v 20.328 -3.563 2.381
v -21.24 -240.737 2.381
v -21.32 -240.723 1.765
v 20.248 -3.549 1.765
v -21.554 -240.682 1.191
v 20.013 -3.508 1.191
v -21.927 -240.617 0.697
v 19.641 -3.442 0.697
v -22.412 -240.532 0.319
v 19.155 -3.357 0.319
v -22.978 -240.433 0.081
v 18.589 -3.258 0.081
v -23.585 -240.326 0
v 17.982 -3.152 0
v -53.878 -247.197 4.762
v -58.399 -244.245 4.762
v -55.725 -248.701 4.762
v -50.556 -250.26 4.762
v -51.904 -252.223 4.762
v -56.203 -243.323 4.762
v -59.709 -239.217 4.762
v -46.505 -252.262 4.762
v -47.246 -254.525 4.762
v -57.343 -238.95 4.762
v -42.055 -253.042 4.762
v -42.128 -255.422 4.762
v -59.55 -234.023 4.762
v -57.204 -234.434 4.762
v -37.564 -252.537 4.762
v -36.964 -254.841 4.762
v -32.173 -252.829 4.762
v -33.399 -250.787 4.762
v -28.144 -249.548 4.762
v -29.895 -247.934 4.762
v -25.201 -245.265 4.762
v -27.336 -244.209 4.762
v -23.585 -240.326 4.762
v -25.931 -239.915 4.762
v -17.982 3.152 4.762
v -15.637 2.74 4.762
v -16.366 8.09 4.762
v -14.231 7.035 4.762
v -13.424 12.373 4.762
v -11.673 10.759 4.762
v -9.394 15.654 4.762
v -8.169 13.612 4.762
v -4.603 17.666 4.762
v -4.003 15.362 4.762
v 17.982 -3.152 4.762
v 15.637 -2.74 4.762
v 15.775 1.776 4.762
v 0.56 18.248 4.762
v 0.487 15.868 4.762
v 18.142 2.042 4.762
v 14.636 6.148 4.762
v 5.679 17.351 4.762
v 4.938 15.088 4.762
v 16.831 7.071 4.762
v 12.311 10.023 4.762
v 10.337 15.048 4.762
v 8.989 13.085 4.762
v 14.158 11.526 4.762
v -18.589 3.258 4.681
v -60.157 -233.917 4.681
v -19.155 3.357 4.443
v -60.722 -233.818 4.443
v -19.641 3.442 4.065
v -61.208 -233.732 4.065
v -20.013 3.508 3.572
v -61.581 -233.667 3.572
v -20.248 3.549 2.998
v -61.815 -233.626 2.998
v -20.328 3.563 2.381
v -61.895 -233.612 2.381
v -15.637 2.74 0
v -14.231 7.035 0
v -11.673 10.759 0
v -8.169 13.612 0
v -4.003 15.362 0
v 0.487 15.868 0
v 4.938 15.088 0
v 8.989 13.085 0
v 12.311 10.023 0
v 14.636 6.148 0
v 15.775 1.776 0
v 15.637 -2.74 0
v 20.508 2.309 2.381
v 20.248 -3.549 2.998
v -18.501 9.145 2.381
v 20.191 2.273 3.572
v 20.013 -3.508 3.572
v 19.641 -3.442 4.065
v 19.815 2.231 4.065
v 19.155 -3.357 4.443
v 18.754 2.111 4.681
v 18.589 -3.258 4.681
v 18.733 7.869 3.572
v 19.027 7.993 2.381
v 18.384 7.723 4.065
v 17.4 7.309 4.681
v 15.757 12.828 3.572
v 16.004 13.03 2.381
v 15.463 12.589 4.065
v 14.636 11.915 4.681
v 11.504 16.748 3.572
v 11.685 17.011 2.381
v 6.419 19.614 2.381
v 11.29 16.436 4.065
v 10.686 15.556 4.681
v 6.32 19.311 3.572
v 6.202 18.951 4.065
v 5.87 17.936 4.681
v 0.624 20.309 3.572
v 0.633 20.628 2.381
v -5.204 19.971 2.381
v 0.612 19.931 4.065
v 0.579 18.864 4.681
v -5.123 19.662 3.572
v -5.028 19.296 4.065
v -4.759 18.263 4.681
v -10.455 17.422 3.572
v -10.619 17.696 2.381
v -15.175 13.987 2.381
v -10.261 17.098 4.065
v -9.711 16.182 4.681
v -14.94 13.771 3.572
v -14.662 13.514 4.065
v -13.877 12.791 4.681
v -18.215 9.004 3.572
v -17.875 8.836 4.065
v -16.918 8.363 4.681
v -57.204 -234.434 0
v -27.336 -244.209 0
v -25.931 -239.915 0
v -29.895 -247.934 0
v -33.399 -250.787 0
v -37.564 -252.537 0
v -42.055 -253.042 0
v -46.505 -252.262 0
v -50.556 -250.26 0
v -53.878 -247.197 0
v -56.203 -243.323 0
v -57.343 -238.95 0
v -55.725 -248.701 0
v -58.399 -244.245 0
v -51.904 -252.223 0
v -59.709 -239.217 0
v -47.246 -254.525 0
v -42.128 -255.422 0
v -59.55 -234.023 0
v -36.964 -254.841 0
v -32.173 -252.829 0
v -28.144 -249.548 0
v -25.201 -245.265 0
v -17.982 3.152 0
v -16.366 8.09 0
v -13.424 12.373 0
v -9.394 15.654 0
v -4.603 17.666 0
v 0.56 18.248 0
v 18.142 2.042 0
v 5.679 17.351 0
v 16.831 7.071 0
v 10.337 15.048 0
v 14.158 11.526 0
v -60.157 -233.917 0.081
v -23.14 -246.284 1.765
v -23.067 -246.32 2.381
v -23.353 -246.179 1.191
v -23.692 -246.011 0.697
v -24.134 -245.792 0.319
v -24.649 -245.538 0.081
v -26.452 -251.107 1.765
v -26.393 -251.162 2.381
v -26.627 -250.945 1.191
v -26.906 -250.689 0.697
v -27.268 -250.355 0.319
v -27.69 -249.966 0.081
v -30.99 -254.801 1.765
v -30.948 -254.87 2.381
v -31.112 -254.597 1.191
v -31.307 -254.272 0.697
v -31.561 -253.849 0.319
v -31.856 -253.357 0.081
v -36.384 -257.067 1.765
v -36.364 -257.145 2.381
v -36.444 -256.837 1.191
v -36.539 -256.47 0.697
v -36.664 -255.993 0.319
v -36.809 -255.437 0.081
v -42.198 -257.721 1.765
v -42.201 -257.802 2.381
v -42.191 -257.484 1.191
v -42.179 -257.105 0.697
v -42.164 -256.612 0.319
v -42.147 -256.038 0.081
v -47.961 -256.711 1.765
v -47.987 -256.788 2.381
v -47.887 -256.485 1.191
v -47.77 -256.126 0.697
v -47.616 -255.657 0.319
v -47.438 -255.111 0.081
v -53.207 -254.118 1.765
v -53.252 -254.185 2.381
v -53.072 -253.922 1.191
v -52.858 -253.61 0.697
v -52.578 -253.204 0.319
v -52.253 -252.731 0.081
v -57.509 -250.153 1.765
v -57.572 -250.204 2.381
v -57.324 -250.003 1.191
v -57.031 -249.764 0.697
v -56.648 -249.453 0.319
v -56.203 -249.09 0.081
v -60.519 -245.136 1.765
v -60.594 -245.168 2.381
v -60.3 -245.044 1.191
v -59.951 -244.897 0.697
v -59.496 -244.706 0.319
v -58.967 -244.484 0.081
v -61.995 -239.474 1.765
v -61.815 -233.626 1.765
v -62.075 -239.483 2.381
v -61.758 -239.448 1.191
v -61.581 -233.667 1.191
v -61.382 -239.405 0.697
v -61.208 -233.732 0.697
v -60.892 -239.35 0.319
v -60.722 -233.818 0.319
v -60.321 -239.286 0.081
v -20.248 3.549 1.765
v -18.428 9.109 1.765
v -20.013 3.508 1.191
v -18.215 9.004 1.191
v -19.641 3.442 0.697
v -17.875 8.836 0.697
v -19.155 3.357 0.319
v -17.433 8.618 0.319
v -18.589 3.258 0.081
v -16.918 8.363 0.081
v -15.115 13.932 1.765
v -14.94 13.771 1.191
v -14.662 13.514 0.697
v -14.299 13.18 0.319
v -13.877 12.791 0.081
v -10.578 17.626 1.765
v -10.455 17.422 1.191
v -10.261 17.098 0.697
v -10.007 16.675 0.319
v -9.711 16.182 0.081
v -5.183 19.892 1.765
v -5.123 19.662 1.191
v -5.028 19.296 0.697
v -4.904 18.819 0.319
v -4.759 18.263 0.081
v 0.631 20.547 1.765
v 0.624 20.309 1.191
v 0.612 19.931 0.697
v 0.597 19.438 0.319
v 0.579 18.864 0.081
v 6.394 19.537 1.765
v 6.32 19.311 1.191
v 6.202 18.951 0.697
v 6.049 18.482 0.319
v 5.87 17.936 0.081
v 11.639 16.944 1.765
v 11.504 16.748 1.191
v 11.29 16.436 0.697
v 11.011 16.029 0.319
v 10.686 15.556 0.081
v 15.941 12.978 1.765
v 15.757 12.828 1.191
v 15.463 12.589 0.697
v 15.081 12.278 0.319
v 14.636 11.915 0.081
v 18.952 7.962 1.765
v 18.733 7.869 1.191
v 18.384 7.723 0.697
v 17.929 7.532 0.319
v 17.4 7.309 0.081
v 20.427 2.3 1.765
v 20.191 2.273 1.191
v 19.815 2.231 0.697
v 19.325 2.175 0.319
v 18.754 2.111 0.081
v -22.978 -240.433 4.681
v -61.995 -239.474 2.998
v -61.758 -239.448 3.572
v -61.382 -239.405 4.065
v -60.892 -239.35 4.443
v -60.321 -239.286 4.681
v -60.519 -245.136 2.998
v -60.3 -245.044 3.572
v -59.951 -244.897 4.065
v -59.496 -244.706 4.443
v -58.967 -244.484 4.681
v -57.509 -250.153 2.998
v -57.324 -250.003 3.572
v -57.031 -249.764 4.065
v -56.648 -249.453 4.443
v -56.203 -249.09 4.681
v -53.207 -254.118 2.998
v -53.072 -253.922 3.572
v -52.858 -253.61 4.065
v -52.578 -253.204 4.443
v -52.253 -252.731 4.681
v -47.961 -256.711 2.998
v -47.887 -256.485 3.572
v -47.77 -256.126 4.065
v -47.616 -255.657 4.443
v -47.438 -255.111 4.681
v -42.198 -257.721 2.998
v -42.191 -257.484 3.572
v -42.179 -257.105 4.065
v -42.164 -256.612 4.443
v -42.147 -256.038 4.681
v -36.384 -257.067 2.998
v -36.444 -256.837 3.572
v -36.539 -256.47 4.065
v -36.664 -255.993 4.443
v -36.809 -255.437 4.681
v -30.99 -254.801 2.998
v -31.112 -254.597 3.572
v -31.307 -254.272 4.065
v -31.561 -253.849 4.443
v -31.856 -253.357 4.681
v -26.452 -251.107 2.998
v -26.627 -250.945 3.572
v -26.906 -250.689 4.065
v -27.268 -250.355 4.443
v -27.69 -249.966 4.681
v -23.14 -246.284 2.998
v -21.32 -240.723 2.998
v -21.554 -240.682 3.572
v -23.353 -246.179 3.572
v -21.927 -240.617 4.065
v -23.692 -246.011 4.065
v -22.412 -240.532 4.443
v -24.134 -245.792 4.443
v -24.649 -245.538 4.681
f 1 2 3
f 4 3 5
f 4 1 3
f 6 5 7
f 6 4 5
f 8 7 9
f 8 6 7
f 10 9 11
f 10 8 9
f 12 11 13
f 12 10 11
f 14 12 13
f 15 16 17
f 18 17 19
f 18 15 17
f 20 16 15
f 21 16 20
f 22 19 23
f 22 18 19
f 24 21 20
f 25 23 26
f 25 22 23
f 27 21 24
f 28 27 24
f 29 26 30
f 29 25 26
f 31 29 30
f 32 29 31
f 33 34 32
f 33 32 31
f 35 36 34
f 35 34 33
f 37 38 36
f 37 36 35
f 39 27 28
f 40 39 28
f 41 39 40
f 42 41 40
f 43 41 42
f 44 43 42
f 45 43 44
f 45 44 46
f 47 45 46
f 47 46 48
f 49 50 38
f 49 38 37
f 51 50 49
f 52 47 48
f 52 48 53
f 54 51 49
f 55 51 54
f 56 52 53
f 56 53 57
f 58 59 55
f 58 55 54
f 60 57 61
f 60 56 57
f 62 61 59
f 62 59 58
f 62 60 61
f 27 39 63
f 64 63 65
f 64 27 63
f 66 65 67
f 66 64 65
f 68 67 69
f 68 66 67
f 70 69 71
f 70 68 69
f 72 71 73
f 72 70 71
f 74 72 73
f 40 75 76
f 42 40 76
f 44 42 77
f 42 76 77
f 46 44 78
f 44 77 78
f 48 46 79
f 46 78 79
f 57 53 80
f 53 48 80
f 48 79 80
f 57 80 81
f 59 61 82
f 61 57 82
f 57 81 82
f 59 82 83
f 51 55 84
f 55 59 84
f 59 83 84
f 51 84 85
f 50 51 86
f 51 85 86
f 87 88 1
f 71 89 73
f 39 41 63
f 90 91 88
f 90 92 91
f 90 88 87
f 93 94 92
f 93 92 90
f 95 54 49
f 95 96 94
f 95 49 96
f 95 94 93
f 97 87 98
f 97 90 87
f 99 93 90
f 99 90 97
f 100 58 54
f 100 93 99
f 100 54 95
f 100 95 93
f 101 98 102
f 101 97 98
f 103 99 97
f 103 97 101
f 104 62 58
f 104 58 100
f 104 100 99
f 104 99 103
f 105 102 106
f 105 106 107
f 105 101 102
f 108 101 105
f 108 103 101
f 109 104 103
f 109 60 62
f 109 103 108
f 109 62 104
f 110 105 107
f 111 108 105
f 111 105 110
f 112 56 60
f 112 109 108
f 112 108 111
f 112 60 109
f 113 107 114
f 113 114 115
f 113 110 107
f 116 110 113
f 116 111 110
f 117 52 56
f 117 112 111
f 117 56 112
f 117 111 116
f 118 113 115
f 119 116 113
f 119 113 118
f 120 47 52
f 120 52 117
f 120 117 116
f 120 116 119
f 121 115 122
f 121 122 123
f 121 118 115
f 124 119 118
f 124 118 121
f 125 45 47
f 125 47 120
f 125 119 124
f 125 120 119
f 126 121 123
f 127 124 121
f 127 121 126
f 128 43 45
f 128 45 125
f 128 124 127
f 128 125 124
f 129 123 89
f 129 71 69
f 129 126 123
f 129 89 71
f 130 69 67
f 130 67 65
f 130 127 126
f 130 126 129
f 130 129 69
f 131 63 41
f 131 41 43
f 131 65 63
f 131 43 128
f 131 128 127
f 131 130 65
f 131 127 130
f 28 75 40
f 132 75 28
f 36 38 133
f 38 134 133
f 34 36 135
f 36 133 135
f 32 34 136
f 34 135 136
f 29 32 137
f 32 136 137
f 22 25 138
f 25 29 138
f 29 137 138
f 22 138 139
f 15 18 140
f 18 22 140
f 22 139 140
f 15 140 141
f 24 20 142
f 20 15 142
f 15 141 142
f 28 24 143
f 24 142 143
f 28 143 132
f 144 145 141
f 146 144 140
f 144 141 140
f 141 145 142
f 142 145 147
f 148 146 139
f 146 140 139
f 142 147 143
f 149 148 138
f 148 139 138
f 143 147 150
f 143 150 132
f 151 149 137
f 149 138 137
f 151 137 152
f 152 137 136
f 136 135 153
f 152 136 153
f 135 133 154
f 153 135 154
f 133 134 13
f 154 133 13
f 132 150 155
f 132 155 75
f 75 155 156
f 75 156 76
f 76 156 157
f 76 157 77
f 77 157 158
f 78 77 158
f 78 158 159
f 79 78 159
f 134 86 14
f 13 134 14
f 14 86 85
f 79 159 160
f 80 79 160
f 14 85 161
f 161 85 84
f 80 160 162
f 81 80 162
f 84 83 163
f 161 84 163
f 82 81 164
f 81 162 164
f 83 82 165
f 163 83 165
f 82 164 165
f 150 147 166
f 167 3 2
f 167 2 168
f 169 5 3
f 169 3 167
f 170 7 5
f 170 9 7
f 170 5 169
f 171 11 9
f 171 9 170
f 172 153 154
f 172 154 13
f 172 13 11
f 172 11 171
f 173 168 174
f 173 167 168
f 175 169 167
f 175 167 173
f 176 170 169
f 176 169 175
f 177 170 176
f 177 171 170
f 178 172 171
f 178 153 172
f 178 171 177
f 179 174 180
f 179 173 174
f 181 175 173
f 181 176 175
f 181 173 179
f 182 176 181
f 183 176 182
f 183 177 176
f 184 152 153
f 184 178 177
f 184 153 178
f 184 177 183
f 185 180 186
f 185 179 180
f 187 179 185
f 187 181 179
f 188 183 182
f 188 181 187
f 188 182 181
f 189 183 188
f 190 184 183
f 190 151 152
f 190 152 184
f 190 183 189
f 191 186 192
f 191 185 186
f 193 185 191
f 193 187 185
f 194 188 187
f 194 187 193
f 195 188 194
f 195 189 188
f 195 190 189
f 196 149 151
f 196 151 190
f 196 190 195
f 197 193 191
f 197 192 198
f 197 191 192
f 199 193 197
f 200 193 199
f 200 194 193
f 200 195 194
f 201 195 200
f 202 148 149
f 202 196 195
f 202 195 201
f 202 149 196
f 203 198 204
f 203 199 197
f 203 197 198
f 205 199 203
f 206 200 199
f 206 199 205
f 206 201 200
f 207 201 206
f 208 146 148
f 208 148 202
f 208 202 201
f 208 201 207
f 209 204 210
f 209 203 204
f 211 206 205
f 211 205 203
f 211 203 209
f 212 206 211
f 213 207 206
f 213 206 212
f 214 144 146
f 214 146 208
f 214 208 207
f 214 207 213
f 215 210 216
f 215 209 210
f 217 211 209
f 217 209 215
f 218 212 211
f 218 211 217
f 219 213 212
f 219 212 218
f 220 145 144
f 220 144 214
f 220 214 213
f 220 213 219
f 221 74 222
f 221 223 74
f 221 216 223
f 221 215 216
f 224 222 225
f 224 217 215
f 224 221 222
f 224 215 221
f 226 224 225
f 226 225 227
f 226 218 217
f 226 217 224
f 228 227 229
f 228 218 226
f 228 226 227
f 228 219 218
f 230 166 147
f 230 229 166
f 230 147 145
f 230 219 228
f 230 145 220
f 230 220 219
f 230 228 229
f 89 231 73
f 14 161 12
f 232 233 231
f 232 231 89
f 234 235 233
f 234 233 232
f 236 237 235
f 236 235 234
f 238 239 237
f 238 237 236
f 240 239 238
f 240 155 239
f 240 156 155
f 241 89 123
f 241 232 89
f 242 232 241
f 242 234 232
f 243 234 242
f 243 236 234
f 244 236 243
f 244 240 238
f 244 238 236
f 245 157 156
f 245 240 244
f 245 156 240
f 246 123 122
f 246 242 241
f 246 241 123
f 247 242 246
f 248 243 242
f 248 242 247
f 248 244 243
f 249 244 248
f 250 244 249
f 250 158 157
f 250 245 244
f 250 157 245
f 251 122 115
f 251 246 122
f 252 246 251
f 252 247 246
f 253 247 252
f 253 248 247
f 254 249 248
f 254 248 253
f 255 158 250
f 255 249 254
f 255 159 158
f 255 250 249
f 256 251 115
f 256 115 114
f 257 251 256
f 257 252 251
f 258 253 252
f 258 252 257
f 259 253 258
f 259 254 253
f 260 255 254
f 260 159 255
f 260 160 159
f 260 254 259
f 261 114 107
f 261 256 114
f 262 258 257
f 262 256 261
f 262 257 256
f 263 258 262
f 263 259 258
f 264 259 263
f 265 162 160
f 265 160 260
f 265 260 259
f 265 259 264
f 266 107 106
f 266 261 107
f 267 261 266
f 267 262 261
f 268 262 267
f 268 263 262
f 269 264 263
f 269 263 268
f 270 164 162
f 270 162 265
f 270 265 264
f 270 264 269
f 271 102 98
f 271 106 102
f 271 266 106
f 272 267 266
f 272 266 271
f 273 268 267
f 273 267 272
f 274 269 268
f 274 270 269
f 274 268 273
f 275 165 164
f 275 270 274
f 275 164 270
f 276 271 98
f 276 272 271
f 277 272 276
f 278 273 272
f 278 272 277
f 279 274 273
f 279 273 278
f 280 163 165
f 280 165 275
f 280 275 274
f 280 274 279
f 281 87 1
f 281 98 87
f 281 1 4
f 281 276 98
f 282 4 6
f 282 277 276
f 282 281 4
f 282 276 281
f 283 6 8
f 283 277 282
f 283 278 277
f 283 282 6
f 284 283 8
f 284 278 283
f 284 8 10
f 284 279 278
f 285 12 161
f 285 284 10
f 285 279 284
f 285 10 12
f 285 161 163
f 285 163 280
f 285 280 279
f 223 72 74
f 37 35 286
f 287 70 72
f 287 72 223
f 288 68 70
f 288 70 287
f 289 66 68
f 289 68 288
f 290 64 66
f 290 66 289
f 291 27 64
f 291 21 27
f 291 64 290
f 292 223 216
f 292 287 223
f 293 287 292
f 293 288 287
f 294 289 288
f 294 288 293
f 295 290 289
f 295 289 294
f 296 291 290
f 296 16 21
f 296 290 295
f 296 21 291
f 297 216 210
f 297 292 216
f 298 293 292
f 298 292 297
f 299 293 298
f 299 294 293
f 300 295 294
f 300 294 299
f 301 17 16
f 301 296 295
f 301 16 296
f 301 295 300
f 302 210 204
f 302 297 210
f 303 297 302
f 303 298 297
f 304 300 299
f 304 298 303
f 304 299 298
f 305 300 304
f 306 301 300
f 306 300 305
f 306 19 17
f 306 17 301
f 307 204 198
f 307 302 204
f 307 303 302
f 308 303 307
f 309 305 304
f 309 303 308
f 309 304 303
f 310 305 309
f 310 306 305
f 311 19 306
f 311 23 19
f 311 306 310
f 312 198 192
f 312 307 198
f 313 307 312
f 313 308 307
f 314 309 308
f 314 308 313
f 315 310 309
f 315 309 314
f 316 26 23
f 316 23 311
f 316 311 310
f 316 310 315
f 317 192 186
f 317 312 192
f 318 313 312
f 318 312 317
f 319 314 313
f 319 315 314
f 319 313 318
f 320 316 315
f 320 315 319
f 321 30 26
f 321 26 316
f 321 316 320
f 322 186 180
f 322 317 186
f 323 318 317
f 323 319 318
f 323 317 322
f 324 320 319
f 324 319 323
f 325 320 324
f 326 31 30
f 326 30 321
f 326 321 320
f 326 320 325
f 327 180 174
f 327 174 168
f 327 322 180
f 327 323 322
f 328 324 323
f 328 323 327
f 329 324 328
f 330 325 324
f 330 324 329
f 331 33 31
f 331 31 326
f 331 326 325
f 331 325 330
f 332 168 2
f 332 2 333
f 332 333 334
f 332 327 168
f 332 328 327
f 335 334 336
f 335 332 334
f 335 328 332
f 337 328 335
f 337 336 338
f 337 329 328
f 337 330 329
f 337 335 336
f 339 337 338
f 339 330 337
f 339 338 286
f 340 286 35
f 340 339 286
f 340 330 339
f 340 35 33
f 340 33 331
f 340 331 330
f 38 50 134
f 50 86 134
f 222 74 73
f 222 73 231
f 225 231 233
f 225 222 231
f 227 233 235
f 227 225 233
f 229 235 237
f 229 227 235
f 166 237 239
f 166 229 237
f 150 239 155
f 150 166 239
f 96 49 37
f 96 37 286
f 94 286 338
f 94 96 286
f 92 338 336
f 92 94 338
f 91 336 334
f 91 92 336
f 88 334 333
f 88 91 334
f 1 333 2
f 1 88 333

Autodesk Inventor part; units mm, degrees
ref_plane "YZ Plane" through (0, 0, 0) normal (1, 0, 0) x (0, 1, 0)
ref_plane "XZ Plane" through (0, 0, 0) normal (0, 1, 0) x (-1, 0, 0)
ref_plane "XY Plane" through (0, 0, 0) normal (0, 0, 1) x (1, 0, 0)
sketch "Sketch1" plane through (0, 0, 0) normal (0, 0, 1) x (1, 0, 0)
  arc A0 (15.6367, -2.7405) -> (-15.6367, 2.7405) centre (0, 0) ccw
  arc A1 (20.3277, -3.5626) -> (-20.3277, 3.5626) centre (0, 0) ccw
  arc A2 (-57.204, -234.4341) -> (-25.9307, -239.9151) centre (-41.5673, -237.1746) ccw
  arc A3 (-61.895, -233.612) -> (-21.2397, -240.7373) centre (-41.5673, -237.1746) ccw
  line L0 (20.3277, -3.5626) -> (-21.2397, -240.7373)
  line L1 (15.6367, -2.7405) -> (-25.9307, -239.9151)
  line L2 (-15.6367, 2.7405) -> (-57.204, -234.4341)
  line L3 (-20.3277, 3.5626) -> (-61.895, -233.612)
  dimension "d0" = 15.875
  dimension "d1" = 4.7625
extrude "Extrusion1" add sketch "Sketch1" along normal blind 4.7625
fillet "Fillet1" radius 2.3813 8 edges at (-45.13, -257.5023, 4.7625) (-41.1113, -115.0247, 4.7625) (3.5626, 20.3277, 4.7625) (-0.456, -122.1499, 4.7625) (3.5626, 20.3277, 0) (-41.1113, -115.0247, 0) (-45.13, -257.5023, 0) (-0.456, -122.1499, 0)
properties part number "Belt_Vertical_Short" material "Polypropylene"
